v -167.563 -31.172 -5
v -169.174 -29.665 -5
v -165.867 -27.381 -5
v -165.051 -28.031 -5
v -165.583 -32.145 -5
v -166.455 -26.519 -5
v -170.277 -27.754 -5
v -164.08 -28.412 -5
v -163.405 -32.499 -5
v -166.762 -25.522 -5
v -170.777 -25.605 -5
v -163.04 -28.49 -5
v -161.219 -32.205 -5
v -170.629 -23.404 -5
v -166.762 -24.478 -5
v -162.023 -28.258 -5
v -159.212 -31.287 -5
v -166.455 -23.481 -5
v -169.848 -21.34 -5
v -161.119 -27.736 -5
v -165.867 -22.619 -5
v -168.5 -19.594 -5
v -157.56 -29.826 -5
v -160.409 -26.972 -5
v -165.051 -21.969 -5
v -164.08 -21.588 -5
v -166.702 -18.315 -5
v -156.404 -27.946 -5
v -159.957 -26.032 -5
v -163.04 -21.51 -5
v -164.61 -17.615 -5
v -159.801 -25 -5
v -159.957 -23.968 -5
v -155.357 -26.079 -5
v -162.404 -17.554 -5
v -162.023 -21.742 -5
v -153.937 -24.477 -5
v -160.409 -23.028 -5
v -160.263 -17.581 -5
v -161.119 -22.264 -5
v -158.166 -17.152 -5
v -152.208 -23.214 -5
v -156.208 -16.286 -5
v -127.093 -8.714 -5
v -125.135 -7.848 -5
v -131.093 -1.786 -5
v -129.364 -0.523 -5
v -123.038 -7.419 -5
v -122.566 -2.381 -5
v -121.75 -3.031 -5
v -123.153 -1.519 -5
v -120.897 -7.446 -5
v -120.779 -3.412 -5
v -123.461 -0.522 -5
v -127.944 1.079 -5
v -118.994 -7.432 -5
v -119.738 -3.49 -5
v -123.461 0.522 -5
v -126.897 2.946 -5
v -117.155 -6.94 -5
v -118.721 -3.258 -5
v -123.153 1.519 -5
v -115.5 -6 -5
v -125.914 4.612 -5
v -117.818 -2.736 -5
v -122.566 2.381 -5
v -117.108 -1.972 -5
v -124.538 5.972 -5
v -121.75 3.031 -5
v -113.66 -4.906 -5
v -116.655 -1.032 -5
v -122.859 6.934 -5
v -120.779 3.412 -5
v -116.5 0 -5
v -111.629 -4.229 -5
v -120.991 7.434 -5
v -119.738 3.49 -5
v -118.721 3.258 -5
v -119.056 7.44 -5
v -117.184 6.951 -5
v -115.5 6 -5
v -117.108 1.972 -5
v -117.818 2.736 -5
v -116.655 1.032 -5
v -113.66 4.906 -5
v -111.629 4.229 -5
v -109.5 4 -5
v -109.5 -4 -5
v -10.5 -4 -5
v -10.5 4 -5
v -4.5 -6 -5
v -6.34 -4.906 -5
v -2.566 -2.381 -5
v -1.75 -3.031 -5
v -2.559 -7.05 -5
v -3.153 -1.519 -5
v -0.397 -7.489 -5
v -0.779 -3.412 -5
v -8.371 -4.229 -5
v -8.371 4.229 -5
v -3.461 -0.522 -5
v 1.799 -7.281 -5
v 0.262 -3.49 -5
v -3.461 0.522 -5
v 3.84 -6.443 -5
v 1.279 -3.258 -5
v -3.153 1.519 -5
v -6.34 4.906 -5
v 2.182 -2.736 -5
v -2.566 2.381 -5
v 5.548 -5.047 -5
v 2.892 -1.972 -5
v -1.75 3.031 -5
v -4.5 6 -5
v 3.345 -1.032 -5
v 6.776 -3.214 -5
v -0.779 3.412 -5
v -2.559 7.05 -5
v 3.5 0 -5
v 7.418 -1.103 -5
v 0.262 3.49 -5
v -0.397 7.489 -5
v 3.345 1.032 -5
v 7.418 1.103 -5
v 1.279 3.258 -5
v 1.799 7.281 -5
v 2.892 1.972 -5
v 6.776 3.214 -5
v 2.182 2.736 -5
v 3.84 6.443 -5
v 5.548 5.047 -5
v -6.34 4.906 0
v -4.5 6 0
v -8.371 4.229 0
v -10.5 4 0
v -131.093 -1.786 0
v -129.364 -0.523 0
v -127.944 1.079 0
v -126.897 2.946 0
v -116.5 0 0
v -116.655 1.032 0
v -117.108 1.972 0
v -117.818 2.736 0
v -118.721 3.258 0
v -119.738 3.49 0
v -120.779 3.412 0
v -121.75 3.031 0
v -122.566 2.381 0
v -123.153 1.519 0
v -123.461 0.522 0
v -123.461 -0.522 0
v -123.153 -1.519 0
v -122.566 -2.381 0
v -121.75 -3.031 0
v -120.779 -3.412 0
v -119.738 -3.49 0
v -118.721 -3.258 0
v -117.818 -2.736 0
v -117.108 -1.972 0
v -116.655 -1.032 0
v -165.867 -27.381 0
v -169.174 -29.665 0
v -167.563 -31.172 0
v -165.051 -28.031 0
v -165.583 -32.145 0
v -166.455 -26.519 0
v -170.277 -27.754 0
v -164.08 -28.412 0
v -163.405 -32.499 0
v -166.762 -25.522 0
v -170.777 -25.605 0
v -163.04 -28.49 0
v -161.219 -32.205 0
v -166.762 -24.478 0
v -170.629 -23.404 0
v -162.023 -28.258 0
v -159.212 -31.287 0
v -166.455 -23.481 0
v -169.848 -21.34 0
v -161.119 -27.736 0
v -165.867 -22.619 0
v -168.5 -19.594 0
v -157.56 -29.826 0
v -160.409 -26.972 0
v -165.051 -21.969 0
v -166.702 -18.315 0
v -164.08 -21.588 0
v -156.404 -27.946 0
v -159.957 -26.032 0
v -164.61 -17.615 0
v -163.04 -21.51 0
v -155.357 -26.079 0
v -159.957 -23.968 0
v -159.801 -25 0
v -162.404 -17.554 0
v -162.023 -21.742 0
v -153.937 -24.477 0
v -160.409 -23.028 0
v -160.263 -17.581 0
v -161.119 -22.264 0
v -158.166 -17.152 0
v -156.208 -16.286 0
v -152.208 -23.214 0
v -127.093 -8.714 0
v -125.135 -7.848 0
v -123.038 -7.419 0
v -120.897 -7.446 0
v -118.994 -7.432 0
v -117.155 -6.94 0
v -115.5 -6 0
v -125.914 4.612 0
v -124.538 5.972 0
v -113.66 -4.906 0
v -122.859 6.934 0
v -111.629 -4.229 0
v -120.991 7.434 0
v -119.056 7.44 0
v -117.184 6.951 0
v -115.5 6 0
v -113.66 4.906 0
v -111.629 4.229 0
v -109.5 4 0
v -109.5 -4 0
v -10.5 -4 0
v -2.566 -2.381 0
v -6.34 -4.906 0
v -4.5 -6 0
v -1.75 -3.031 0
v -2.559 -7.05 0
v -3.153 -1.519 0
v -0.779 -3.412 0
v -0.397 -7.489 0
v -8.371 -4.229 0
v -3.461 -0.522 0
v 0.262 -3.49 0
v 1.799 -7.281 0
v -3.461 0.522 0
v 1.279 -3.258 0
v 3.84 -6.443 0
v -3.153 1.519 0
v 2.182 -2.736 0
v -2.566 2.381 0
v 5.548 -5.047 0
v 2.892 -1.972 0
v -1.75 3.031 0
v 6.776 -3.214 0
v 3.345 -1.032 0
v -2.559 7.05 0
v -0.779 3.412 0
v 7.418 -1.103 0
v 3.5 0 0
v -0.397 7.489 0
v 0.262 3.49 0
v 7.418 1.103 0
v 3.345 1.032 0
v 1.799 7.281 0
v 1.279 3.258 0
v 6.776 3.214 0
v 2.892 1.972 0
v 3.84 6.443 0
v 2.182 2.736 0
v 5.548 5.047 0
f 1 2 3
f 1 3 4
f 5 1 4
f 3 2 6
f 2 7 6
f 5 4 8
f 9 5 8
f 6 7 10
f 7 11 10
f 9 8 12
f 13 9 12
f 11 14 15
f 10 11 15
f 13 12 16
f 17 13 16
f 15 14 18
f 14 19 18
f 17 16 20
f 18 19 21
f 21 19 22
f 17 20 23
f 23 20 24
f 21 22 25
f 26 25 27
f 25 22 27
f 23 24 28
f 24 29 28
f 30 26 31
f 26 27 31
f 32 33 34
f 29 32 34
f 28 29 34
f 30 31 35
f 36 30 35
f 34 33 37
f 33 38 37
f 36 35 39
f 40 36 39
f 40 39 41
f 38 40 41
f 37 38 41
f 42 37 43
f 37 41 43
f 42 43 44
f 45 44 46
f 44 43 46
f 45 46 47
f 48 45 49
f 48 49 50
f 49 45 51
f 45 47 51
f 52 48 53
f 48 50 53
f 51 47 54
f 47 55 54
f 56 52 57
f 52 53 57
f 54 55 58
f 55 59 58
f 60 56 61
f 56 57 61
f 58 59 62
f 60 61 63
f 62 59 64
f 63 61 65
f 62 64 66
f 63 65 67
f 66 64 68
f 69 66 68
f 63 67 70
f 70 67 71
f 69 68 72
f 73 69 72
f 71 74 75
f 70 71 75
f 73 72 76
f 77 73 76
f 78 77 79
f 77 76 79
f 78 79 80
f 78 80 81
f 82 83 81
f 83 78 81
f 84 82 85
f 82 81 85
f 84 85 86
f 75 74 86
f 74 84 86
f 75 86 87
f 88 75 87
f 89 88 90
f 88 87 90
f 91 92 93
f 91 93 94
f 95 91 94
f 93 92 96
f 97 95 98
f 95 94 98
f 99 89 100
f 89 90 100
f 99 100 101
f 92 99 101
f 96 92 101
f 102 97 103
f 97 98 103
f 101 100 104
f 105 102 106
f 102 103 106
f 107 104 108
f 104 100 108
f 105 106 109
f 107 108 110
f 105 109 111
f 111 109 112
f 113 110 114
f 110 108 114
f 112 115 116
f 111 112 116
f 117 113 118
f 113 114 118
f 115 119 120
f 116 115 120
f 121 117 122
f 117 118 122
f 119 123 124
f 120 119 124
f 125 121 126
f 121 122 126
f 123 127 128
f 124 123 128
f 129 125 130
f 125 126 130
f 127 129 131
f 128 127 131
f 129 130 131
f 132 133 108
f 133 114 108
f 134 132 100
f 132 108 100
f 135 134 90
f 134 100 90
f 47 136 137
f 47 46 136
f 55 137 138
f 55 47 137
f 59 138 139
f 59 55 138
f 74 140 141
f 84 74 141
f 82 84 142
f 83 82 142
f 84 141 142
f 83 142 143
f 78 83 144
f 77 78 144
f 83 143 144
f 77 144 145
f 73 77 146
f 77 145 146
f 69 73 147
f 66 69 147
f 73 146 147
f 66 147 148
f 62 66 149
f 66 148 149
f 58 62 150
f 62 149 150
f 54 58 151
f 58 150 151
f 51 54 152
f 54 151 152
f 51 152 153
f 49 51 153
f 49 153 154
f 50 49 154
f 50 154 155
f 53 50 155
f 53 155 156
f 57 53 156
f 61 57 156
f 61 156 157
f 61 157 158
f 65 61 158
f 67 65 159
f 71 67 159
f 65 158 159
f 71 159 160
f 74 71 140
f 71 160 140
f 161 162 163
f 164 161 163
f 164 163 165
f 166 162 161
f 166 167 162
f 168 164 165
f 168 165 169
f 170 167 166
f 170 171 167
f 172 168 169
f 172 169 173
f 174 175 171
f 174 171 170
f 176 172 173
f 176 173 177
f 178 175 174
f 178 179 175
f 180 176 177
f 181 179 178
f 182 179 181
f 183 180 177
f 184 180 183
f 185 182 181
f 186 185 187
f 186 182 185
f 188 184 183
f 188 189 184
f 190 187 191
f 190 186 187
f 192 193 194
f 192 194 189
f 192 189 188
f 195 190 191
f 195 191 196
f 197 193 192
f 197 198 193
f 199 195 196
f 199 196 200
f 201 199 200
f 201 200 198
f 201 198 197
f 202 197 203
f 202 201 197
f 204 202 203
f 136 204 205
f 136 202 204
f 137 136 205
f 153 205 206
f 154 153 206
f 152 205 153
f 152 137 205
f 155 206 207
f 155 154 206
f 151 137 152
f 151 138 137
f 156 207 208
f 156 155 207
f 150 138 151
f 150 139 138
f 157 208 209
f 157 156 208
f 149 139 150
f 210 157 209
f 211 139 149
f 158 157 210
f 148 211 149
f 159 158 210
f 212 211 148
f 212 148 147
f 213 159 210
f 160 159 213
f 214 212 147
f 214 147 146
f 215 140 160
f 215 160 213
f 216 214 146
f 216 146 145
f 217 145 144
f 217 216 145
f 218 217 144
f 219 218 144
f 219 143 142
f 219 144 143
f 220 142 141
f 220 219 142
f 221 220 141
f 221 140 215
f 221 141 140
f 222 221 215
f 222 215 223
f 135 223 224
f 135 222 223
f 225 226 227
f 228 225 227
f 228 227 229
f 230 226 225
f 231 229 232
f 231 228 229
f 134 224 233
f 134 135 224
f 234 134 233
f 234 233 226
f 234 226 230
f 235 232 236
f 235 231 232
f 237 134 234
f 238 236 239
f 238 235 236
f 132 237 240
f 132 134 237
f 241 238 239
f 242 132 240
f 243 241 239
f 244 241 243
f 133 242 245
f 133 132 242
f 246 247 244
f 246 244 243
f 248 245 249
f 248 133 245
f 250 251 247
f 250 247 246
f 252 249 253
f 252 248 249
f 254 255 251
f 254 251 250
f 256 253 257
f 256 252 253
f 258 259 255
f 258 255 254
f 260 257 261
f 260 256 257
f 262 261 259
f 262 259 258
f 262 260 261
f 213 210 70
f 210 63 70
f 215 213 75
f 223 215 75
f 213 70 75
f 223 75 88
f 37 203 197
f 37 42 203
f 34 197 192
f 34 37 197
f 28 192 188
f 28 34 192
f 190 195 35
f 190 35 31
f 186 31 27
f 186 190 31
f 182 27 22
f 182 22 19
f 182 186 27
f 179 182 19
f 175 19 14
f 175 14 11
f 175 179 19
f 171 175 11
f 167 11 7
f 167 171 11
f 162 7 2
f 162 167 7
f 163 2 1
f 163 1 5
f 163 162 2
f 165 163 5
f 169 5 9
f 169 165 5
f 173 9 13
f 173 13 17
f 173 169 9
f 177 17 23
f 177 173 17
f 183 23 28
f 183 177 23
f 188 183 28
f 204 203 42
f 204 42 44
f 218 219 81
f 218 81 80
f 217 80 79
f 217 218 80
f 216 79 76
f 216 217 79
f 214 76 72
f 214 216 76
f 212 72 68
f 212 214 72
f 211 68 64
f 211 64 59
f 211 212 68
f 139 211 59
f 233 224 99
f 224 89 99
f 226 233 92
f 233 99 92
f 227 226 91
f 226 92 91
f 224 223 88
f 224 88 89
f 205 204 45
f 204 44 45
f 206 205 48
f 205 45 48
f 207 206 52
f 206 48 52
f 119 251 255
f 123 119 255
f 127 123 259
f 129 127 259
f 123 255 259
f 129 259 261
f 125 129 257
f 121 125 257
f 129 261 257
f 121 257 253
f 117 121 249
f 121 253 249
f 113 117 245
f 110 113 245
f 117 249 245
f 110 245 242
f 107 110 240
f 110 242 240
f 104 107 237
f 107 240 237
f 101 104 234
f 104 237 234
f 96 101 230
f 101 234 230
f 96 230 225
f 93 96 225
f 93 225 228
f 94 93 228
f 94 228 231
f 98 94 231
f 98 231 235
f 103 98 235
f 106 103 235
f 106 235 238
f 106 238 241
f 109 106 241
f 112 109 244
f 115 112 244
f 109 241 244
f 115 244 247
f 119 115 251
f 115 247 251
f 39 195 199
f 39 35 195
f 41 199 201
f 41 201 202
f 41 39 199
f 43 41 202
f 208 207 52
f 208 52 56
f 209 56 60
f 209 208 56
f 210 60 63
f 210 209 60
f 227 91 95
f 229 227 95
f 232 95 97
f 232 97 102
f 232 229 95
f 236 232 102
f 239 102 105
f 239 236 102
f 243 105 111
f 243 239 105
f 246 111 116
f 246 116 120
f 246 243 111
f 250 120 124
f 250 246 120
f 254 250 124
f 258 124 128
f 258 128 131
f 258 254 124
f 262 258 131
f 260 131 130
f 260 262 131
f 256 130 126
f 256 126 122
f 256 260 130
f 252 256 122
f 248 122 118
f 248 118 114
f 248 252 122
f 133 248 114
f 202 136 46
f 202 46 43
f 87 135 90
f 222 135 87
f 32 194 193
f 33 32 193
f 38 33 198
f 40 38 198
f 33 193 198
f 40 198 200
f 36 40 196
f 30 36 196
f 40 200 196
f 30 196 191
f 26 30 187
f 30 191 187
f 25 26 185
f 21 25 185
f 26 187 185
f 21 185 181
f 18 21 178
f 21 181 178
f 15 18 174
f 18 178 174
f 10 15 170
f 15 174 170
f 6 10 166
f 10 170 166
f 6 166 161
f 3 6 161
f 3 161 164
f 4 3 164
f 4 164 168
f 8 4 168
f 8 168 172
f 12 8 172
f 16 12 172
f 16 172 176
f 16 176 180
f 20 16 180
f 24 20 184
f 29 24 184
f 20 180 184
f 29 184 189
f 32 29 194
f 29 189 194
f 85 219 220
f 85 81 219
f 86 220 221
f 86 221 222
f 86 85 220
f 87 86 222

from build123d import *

# Parameters (mm, degrees)
SKETCH1_R          = 3.5
BASE_FLANGE1_DEPTH = 5
FILLET1_R          = 10


# Sheet-metal steps are written as plain solids
with BuildPart() as part:
    # Sketch1 → Base-Flange1 (new body)
    with BuildSketch(Plane.XY):
        with BuildLine():
            Line((-155.806954945, -25.29195723), (-123.494315244, -6.636246))
            ThreePointArc((-123.494315244, -6.636246), (-118.058857162, -7.244443697), (-113.65571123, -4))
            Line((-113.65571123, -4), (-6.34428877, -4))
            ThreePointArc((-6.34428877, -4), (7.5, 0), (-6.34428877, 4))
            Line((-6.34428877, 4), (-113.65571123, 4))
            ThreePointArc((-113.65571123, 4), (-121.941142838, 7.244443697), (-127.494315244, 0.29195723))
            Line((-127.494315244, 0.29195723), (-159.806954945, -18.363754))
            ThreePointArc((-159.806954945, -18.363754), (-169.796460718, -28.75), (-155.806954945, -25.29195723))
        make_face()
        Circle(SKETCH1_R, mode=Mode.SUBTRACT)
        with Locations((-120, 0)):
            Circle(SKETCH1_R, mode=Mode.SUBTRACT)
        with Locations((-163.301270189, -25)):
            Circle(SKETCH1_R, mode=Mode.SUBTRACT)
    extrude(amount=-BASE_FLANGE1_DEPTH)

    # Fillet1
    fillet1_edges = [part.edges().sort_by_distance(p)[0] for p in [
        (-159.806954945, -18.363754, -2.5),
        (-127.494315244, 0.29195723, -2.5),
        (-113.65571123, 4, -2.5),
        (-6.34428877, 4, -2.5),
        (-6.34428877, -4, -2.5),
        (-113.65571123, -4, -2.5),
        (-123.494315244, -6.636246, -2.5),
        (-155.806954945, -25.29195723, -2.5),
    ]]
    fillet(fillet1_edges, radius=FILLET1_R)


solid = part.part
